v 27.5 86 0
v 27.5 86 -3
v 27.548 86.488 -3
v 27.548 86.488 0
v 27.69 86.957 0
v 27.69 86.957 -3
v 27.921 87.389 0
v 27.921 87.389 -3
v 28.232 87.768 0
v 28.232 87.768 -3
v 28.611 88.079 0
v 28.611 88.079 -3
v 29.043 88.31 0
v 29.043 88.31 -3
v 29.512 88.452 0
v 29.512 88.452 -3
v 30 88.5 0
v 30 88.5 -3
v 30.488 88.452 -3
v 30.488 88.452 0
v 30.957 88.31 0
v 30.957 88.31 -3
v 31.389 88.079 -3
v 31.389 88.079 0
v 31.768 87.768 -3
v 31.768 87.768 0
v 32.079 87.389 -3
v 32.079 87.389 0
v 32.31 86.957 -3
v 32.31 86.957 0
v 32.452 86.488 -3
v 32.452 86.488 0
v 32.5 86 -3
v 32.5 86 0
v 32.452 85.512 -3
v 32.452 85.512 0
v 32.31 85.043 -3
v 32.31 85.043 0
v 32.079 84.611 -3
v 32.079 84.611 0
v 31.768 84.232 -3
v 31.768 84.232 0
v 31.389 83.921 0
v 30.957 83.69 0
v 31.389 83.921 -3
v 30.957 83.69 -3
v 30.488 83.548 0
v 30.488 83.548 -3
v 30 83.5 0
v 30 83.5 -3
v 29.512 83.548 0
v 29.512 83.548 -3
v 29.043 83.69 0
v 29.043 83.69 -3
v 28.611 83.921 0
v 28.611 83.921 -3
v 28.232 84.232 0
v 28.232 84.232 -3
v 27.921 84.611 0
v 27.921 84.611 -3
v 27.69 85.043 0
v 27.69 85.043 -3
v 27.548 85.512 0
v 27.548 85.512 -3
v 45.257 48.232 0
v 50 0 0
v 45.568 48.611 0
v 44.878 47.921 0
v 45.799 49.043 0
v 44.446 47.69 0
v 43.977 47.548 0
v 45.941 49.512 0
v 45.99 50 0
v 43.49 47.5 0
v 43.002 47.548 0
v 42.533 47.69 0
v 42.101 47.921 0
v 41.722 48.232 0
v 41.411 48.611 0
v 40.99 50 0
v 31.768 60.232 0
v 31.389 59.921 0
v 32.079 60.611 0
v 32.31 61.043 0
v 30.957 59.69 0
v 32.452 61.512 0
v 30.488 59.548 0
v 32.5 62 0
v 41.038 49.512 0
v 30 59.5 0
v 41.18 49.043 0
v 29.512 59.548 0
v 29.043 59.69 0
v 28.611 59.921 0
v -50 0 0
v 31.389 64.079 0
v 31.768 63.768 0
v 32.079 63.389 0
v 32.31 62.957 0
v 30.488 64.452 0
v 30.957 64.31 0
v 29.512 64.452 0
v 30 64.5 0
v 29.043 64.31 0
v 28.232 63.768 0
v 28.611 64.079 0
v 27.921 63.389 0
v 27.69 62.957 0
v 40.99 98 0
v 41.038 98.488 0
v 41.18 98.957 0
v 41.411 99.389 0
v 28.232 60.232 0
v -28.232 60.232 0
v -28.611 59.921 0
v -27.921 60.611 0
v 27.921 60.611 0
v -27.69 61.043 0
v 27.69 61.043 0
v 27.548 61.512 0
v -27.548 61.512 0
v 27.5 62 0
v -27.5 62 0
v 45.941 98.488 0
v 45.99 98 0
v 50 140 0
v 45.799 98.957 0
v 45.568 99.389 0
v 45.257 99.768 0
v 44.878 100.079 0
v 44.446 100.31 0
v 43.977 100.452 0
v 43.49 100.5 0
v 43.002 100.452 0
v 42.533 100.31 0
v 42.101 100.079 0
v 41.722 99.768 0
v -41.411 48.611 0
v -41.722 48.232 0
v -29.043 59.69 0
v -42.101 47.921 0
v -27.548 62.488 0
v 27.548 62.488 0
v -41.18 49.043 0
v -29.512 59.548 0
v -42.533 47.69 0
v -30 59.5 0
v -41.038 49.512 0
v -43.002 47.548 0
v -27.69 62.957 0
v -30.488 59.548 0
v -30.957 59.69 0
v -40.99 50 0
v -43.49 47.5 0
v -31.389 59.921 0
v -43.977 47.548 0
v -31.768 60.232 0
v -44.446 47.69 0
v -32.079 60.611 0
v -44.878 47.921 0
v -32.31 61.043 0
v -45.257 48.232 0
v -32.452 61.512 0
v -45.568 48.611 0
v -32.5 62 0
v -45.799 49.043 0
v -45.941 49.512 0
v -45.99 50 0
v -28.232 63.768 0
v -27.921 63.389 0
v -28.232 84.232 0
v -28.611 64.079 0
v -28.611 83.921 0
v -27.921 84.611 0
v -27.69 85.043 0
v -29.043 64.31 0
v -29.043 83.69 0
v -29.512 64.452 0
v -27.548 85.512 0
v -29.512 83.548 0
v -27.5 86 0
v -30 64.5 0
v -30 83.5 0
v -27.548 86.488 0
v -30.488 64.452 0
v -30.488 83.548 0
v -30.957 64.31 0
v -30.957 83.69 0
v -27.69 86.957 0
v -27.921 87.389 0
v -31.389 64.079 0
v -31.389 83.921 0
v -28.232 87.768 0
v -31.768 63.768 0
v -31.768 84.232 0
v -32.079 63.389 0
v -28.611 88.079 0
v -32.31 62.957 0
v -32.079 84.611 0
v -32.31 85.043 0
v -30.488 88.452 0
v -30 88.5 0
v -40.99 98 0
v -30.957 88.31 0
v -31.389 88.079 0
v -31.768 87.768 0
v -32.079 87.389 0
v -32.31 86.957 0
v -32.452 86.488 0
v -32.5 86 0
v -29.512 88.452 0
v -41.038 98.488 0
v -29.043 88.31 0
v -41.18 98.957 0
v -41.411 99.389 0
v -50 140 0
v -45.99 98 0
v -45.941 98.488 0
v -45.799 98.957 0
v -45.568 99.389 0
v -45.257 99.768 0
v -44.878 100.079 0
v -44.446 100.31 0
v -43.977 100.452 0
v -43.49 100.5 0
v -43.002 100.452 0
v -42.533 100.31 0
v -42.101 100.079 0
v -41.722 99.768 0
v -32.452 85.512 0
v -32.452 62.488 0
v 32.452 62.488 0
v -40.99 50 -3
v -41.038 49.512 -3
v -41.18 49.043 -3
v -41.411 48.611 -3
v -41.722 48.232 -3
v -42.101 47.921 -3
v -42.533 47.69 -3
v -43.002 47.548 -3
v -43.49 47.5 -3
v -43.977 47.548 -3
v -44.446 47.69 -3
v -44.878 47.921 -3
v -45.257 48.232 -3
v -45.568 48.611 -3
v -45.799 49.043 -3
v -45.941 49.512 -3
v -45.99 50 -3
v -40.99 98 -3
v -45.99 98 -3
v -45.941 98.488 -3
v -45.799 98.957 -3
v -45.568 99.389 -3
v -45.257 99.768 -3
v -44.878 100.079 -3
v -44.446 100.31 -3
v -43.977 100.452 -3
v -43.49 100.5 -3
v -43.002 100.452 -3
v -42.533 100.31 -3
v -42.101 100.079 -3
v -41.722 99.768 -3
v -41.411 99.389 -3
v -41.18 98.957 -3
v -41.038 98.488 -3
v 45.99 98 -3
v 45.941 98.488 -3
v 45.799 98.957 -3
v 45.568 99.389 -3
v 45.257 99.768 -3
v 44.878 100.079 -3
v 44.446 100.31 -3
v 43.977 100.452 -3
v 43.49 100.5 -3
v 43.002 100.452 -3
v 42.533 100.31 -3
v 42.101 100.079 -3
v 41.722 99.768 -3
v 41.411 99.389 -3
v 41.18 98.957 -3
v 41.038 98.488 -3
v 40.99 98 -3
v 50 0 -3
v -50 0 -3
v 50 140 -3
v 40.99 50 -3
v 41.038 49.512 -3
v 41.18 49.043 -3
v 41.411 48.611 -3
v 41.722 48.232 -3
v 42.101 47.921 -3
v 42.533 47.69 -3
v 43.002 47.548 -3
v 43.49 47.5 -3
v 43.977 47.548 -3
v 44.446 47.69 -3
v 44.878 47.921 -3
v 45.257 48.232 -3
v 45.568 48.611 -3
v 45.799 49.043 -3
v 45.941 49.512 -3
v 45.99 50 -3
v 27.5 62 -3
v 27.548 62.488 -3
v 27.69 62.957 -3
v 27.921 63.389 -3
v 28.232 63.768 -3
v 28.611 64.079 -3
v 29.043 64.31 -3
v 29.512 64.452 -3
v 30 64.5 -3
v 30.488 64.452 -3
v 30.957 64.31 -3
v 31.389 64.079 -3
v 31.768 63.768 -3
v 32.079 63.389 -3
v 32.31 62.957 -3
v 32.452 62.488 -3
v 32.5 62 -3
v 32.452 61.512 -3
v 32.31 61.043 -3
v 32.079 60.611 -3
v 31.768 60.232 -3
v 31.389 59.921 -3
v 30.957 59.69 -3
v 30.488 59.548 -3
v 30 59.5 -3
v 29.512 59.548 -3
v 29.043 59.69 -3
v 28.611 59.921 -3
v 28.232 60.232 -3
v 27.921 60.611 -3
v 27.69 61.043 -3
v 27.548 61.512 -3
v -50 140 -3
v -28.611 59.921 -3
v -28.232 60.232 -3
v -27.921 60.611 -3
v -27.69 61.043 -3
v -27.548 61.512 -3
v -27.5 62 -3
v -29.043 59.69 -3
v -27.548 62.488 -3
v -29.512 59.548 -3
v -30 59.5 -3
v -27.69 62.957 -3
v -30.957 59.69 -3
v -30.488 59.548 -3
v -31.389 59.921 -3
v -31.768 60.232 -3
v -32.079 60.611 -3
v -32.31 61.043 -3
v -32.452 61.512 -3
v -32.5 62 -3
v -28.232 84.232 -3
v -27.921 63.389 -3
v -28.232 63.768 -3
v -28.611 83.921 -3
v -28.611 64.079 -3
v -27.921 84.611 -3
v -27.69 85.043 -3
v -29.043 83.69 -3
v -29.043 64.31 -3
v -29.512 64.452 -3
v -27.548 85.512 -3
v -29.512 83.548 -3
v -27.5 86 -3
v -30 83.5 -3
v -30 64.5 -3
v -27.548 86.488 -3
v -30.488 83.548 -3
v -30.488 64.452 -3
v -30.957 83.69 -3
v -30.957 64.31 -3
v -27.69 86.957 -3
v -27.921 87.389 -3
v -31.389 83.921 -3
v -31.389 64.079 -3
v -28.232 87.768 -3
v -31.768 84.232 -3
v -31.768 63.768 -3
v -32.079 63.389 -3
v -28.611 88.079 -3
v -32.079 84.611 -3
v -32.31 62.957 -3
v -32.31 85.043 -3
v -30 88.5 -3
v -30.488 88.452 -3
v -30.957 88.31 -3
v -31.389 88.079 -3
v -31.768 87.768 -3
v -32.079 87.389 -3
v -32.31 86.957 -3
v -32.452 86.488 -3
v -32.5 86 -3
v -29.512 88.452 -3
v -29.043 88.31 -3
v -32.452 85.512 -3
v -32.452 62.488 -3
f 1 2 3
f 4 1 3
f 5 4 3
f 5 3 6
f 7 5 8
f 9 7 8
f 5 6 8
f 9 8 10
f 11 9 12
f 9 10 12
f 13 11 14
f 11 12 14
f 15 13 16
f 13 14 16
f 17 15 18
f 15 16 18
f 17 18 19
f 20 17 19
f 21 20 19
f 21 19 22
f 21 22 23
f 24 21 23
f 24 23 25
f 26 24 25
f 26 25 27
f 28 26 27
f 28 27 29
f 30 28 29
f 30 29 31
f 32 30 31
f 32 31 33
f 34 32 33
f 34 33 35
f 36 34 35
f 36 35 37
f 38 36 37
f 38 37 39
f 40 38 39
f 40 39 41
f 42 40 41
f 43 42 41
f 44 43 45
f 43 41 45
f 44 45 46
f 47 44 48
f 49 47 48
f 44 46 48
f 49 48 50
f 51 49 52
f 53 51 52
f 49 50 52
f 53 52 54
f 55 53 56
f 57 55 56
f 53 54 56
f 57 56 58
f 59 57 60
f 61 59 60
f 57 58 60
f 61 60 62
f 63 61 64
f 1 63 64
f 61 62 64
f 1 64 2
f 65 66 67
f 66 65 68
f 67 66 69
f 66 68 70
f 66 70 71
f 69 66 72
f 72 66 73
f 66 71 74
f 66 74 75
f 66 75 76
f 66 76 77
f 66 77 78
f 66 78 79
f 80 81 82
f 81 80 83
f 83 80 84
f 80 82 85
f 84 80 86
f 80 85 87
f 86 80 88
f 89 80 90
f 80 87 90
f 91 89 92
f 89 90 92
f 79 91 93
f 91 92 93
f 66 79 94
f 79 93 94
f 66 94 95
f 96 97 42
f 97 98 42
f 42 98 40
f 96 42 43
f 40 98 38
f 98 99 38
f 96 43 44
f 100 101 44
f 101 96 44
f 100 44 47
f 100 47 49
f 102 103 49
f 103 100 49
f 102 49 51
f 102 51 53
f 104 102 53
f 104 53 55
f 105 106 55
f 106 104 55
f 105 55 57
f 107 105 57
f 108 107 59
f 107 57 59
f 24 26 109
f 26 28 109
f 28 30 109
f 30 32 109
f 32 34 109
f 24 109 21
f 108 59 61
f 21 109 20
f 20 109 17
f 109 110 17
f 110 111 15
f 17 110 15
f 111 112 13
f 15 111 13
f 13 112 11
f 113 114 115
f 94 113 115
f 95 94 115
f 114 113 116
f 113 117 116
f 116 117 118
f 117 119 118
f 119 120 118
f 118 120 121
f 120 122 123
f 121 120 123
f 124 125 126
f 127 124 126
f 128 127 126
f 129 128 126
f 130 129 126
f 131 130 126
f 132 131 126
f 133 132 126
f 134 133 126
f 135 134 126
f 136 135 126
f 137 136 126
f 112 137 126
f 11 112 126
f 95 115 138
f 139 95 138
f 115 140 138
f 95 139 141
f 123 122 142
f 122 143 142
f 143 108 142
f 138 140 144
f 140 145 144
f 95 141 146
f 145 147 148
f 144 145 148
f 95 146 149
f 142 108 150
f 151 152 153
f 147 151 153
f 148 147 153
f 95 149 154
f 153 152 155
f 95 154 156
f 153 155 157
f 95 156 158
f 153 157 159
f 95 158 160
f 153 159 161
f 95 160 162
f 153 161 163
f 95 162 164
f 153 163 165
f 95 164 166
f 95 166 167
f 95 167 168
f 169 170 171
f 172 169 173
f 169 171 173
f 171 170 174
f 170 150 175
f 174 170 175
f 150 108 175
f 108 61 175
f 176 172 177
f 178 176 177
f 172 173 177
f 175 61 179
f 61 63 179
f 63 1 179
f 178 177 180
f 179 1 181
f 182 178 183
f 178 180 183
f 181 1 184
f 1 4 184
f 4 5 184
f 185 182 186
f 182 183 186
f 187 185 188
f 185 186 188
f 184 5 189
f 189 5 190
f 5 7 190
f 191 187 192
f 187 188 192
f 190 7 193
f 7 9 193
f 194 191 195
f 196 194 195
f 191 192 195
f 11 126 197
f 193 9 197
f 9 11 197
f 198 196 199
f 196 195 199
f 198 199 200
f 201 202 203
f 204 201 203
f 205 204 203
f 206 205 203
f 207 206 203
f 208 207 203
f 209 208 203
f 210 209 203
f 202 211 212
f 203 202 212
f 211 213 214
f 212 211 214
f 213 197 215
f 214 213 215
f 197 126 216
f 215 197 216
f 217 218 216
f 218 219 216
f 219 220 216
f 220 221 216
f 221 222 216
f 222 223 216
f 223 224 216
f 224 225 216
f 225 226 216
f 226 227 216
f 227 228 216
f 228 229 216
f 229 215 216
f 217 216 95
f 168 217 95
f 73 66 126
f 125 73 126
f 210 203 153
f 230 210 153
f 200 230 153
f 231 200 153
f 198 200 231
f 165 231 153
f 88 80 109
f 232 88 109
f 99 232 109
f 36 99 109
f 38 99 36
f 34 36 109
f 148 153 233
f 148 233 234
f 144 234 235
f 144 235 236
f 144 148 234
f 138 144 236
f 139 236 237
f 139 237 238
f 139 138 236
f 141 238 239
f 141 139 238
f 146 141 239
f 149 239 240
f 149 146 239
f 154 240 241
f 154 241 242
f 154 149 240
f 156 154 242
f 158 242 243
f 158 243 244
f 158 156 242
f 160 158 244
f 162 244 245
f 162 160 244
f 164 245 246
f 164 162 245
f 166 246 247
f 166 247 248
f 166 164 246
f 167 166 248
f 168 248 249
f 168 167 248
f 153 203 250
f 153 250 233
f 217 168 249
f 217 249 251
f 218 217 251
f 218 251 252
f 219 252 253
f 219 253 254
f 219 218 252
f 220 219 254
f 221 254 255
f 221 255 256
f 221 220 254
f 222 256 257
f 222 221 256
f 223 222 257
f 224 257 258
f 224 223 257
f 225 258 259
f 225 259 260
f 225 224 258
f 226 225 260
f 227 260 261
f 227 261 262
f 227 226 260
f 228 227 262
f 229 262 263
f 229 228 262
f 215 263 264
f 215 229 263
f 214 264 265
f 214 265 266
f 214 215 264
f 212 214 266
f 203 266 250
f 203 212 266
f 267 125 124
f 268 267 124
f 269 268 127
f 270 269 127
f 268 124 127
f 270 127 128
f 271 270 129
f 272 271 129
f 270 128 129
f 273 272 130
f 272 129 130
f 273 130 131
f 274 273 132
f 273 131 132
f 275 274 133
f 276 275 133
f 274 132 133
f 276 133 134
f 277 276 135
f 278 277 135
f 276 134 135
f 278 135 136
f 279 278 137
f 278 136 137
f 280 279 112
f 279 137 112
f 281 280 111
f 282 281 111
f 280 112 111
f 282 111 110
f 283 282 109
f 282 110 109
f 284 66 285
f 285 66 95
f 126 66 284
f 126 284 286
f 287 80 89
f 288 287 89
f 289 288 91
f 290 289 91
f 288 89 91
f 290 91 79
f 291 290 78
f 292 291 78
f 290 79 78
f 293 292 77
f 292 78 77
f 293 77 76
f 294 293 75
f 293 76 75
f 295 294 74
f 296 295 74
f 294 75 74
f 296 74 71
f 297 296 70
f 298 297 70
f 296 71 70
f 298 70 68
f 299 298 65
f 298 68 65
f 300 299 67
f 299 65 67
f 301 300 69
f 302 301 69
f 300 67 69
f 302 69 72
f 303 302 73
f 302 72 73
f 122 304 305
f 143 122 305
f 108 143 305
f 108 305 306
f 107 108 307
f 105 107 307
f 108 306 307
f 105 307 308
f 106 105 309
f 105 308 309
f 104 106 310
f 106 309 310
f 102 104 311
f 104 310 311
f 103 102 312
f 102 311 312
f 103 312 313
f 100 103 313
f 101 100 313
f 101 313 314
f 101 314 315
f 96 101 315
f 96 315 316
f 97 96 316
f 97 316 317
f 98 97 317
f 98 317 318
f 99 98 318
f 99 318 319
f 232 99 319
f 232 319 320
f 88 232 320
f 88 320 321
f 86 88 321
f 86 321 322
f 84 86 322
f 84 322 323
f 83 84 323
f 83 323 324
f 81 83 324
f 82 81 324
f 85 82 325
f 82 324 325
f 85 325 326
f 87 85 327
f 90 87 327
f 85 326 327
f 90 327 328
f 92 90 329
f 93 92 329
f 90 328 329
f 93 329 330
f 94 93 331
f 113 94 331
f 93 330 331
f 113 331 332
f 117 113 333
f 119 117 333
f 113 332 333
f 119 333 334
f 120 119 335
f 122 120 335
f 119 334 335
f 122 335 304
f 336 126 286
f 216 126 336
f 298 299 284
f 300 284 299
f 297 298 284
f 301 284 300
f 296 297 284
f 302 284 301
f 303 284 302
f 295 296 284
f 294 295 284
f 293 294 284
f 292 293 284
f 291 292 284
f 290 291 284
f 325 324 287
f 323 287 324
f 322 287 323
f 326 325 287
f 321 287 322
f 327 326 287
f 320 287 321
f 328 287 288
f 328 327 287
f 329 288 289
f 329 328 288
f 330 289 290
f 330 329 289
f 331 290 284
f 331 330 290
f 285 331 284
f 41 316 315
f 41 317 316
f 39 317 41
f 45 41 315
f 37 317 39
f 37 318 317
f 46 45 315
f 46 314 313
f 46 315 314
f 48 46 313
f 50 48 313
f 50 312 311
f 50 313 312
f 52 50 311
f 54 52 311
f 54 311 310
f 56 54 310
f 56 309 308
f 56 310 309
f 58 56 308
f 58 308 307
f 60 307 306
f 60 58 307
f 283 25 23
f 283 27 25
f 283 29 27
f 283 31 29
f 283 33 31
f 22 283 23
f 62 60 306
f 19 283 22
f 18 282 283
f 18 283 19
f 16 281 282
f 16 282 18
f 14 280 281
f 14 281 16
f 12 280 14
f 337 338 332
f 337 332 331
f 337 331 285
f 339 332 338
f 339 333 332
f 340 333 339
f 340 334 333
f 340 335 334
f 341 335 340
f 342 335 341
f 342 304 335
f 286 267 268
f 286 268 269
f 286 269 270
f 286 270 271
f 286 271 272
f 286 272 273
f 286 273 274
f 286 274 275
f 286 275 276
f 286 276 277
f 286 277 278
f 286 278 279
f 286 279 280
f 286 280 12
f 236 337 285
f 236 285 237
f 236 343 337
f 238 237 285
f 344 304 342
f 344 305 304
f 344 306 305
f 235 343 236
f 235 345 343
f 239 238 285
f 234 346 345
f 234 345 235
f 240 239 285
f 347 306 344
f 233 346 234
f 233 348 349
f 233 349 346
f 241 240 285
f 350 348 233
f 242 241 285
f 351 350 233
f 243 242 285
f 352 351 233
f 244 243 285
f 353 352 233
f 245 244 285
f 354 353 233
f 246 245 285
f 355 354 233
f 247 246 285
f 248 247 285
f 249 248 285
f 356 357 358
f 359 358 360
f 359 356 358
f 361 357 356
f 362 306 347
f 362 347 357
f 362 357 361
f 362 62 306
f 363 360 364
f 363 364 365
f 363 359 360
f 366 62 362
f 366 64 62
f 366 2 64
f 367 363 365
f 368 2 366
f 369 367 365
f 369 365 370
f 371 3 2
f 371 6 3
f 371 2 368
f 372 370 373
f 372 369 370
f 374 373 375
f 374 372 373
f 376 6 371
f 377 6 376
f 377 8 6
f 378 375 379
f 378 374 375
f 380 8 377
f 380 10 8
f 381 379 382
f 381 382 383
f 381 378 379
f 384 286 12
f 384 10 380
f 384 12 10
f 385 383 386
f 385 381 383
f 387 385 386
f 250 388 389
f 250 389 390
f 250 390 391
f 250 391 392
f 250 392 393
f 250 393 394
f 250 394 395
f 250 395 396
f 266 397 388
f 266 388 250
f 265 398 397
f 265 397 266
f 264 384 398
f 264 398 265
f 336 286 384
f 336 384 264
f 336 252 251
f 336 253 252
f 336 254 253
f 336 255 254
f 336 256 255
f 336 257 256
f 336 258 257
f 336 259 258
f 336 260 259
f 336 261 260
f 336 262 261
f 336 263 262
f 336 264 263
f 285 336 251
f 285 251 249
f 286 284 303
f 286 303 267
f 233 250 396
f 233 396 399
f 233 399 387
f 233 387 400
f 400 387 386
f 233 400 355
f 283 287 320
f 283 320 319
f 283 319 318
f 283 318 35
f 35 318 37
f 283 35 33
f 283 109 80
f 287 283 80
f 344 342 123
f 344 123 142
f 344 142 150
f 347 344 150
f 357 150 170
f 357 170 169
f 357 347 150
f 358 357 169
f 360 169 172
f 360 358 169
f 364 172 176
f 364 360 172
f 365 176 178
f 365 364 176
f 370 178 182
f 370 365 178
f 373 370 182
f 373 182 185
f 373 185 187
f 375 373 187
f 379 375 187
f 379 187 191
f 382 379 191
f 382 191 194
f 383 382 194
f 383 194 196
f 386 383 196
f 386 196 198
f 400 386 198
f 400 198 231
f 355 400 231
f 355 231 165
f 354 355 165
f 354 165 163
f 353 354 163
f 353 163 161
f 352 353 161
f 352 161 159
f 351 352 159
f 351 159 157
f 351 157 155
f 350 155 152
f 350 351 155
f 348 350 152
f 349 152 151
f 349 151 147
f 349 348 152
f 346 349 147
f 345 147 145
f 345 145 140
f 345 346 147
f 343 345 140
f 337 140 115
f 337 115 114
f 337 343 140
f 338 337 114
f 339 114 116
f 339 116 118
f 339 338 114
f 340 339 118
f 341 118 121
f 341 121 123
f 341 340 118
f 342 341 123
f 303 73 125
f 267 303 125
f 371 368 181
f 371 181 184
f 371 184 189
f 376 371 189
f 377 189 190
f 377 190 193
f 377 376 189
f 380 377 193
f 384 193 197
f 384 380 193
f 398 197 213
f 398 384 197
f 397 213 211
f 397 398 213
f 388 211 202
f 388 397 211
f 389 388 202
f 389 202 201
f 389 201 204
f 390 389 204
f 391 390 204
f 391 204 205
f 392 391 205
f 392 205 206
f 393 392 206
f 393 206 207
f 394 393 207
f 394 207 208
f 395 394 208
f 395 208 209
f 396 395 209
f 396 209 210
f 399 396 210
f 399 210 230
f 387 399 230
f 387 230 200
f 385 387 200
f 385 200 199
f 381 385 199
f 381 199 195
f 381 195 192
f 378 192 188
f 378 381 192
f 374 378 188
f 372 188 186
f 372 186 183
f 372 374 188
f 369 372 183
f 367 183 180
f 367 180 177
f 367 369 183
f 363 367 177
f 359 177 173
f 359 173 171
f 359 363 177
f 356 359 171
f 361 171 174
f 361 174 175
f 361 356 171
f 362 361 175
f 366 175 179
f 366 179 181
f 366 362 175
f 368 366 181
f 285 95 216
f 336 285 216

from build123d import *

# Parameters (mm, degrees)
F0_W     = 50
F0_H     = 140
F1_DEPTH = 3
F3_D     = 5
F5_DEPTH = 39.832257


with BuildPart() as f1:
    # F0 (on Top) → F1 (new body)
    with BuildSketch(Plane.XY):
        with Locations((25, 70)):
            Rectangle(F0_W, F0_H)
    extrude(amount=-F1_DEPTH)

    # F3 (through all)
    with Locations(Plane.XY):
        with Locations((30, 86), (30, 62)):
            Hole(F3_D / 2)

    # F4 (on face) → F5 (cut)
    with BuildSketch(Plane.XY):
        with BuildLine():
            ThreePointArc((40.989516, 50), (43.489516, 47.5), (45.989516, 50))
            Line((45.989516, 50), (45.989516, 98))
            ThreePointArc((45.989516, 98), (43.489516, 100.5), (40.989516, 98))
            Line((40.989516, 98), (40.989516, 50))
        make_face()
    extrude(amount=-F5_DEPTH, mode=Mode.SUBTRACT)

    # F6: F1 across plane


with BuildPart() as f1_1:
    add(f1.part)
    add(f1.part.mirror(Plane.YZ))


solid = f1_1.part
